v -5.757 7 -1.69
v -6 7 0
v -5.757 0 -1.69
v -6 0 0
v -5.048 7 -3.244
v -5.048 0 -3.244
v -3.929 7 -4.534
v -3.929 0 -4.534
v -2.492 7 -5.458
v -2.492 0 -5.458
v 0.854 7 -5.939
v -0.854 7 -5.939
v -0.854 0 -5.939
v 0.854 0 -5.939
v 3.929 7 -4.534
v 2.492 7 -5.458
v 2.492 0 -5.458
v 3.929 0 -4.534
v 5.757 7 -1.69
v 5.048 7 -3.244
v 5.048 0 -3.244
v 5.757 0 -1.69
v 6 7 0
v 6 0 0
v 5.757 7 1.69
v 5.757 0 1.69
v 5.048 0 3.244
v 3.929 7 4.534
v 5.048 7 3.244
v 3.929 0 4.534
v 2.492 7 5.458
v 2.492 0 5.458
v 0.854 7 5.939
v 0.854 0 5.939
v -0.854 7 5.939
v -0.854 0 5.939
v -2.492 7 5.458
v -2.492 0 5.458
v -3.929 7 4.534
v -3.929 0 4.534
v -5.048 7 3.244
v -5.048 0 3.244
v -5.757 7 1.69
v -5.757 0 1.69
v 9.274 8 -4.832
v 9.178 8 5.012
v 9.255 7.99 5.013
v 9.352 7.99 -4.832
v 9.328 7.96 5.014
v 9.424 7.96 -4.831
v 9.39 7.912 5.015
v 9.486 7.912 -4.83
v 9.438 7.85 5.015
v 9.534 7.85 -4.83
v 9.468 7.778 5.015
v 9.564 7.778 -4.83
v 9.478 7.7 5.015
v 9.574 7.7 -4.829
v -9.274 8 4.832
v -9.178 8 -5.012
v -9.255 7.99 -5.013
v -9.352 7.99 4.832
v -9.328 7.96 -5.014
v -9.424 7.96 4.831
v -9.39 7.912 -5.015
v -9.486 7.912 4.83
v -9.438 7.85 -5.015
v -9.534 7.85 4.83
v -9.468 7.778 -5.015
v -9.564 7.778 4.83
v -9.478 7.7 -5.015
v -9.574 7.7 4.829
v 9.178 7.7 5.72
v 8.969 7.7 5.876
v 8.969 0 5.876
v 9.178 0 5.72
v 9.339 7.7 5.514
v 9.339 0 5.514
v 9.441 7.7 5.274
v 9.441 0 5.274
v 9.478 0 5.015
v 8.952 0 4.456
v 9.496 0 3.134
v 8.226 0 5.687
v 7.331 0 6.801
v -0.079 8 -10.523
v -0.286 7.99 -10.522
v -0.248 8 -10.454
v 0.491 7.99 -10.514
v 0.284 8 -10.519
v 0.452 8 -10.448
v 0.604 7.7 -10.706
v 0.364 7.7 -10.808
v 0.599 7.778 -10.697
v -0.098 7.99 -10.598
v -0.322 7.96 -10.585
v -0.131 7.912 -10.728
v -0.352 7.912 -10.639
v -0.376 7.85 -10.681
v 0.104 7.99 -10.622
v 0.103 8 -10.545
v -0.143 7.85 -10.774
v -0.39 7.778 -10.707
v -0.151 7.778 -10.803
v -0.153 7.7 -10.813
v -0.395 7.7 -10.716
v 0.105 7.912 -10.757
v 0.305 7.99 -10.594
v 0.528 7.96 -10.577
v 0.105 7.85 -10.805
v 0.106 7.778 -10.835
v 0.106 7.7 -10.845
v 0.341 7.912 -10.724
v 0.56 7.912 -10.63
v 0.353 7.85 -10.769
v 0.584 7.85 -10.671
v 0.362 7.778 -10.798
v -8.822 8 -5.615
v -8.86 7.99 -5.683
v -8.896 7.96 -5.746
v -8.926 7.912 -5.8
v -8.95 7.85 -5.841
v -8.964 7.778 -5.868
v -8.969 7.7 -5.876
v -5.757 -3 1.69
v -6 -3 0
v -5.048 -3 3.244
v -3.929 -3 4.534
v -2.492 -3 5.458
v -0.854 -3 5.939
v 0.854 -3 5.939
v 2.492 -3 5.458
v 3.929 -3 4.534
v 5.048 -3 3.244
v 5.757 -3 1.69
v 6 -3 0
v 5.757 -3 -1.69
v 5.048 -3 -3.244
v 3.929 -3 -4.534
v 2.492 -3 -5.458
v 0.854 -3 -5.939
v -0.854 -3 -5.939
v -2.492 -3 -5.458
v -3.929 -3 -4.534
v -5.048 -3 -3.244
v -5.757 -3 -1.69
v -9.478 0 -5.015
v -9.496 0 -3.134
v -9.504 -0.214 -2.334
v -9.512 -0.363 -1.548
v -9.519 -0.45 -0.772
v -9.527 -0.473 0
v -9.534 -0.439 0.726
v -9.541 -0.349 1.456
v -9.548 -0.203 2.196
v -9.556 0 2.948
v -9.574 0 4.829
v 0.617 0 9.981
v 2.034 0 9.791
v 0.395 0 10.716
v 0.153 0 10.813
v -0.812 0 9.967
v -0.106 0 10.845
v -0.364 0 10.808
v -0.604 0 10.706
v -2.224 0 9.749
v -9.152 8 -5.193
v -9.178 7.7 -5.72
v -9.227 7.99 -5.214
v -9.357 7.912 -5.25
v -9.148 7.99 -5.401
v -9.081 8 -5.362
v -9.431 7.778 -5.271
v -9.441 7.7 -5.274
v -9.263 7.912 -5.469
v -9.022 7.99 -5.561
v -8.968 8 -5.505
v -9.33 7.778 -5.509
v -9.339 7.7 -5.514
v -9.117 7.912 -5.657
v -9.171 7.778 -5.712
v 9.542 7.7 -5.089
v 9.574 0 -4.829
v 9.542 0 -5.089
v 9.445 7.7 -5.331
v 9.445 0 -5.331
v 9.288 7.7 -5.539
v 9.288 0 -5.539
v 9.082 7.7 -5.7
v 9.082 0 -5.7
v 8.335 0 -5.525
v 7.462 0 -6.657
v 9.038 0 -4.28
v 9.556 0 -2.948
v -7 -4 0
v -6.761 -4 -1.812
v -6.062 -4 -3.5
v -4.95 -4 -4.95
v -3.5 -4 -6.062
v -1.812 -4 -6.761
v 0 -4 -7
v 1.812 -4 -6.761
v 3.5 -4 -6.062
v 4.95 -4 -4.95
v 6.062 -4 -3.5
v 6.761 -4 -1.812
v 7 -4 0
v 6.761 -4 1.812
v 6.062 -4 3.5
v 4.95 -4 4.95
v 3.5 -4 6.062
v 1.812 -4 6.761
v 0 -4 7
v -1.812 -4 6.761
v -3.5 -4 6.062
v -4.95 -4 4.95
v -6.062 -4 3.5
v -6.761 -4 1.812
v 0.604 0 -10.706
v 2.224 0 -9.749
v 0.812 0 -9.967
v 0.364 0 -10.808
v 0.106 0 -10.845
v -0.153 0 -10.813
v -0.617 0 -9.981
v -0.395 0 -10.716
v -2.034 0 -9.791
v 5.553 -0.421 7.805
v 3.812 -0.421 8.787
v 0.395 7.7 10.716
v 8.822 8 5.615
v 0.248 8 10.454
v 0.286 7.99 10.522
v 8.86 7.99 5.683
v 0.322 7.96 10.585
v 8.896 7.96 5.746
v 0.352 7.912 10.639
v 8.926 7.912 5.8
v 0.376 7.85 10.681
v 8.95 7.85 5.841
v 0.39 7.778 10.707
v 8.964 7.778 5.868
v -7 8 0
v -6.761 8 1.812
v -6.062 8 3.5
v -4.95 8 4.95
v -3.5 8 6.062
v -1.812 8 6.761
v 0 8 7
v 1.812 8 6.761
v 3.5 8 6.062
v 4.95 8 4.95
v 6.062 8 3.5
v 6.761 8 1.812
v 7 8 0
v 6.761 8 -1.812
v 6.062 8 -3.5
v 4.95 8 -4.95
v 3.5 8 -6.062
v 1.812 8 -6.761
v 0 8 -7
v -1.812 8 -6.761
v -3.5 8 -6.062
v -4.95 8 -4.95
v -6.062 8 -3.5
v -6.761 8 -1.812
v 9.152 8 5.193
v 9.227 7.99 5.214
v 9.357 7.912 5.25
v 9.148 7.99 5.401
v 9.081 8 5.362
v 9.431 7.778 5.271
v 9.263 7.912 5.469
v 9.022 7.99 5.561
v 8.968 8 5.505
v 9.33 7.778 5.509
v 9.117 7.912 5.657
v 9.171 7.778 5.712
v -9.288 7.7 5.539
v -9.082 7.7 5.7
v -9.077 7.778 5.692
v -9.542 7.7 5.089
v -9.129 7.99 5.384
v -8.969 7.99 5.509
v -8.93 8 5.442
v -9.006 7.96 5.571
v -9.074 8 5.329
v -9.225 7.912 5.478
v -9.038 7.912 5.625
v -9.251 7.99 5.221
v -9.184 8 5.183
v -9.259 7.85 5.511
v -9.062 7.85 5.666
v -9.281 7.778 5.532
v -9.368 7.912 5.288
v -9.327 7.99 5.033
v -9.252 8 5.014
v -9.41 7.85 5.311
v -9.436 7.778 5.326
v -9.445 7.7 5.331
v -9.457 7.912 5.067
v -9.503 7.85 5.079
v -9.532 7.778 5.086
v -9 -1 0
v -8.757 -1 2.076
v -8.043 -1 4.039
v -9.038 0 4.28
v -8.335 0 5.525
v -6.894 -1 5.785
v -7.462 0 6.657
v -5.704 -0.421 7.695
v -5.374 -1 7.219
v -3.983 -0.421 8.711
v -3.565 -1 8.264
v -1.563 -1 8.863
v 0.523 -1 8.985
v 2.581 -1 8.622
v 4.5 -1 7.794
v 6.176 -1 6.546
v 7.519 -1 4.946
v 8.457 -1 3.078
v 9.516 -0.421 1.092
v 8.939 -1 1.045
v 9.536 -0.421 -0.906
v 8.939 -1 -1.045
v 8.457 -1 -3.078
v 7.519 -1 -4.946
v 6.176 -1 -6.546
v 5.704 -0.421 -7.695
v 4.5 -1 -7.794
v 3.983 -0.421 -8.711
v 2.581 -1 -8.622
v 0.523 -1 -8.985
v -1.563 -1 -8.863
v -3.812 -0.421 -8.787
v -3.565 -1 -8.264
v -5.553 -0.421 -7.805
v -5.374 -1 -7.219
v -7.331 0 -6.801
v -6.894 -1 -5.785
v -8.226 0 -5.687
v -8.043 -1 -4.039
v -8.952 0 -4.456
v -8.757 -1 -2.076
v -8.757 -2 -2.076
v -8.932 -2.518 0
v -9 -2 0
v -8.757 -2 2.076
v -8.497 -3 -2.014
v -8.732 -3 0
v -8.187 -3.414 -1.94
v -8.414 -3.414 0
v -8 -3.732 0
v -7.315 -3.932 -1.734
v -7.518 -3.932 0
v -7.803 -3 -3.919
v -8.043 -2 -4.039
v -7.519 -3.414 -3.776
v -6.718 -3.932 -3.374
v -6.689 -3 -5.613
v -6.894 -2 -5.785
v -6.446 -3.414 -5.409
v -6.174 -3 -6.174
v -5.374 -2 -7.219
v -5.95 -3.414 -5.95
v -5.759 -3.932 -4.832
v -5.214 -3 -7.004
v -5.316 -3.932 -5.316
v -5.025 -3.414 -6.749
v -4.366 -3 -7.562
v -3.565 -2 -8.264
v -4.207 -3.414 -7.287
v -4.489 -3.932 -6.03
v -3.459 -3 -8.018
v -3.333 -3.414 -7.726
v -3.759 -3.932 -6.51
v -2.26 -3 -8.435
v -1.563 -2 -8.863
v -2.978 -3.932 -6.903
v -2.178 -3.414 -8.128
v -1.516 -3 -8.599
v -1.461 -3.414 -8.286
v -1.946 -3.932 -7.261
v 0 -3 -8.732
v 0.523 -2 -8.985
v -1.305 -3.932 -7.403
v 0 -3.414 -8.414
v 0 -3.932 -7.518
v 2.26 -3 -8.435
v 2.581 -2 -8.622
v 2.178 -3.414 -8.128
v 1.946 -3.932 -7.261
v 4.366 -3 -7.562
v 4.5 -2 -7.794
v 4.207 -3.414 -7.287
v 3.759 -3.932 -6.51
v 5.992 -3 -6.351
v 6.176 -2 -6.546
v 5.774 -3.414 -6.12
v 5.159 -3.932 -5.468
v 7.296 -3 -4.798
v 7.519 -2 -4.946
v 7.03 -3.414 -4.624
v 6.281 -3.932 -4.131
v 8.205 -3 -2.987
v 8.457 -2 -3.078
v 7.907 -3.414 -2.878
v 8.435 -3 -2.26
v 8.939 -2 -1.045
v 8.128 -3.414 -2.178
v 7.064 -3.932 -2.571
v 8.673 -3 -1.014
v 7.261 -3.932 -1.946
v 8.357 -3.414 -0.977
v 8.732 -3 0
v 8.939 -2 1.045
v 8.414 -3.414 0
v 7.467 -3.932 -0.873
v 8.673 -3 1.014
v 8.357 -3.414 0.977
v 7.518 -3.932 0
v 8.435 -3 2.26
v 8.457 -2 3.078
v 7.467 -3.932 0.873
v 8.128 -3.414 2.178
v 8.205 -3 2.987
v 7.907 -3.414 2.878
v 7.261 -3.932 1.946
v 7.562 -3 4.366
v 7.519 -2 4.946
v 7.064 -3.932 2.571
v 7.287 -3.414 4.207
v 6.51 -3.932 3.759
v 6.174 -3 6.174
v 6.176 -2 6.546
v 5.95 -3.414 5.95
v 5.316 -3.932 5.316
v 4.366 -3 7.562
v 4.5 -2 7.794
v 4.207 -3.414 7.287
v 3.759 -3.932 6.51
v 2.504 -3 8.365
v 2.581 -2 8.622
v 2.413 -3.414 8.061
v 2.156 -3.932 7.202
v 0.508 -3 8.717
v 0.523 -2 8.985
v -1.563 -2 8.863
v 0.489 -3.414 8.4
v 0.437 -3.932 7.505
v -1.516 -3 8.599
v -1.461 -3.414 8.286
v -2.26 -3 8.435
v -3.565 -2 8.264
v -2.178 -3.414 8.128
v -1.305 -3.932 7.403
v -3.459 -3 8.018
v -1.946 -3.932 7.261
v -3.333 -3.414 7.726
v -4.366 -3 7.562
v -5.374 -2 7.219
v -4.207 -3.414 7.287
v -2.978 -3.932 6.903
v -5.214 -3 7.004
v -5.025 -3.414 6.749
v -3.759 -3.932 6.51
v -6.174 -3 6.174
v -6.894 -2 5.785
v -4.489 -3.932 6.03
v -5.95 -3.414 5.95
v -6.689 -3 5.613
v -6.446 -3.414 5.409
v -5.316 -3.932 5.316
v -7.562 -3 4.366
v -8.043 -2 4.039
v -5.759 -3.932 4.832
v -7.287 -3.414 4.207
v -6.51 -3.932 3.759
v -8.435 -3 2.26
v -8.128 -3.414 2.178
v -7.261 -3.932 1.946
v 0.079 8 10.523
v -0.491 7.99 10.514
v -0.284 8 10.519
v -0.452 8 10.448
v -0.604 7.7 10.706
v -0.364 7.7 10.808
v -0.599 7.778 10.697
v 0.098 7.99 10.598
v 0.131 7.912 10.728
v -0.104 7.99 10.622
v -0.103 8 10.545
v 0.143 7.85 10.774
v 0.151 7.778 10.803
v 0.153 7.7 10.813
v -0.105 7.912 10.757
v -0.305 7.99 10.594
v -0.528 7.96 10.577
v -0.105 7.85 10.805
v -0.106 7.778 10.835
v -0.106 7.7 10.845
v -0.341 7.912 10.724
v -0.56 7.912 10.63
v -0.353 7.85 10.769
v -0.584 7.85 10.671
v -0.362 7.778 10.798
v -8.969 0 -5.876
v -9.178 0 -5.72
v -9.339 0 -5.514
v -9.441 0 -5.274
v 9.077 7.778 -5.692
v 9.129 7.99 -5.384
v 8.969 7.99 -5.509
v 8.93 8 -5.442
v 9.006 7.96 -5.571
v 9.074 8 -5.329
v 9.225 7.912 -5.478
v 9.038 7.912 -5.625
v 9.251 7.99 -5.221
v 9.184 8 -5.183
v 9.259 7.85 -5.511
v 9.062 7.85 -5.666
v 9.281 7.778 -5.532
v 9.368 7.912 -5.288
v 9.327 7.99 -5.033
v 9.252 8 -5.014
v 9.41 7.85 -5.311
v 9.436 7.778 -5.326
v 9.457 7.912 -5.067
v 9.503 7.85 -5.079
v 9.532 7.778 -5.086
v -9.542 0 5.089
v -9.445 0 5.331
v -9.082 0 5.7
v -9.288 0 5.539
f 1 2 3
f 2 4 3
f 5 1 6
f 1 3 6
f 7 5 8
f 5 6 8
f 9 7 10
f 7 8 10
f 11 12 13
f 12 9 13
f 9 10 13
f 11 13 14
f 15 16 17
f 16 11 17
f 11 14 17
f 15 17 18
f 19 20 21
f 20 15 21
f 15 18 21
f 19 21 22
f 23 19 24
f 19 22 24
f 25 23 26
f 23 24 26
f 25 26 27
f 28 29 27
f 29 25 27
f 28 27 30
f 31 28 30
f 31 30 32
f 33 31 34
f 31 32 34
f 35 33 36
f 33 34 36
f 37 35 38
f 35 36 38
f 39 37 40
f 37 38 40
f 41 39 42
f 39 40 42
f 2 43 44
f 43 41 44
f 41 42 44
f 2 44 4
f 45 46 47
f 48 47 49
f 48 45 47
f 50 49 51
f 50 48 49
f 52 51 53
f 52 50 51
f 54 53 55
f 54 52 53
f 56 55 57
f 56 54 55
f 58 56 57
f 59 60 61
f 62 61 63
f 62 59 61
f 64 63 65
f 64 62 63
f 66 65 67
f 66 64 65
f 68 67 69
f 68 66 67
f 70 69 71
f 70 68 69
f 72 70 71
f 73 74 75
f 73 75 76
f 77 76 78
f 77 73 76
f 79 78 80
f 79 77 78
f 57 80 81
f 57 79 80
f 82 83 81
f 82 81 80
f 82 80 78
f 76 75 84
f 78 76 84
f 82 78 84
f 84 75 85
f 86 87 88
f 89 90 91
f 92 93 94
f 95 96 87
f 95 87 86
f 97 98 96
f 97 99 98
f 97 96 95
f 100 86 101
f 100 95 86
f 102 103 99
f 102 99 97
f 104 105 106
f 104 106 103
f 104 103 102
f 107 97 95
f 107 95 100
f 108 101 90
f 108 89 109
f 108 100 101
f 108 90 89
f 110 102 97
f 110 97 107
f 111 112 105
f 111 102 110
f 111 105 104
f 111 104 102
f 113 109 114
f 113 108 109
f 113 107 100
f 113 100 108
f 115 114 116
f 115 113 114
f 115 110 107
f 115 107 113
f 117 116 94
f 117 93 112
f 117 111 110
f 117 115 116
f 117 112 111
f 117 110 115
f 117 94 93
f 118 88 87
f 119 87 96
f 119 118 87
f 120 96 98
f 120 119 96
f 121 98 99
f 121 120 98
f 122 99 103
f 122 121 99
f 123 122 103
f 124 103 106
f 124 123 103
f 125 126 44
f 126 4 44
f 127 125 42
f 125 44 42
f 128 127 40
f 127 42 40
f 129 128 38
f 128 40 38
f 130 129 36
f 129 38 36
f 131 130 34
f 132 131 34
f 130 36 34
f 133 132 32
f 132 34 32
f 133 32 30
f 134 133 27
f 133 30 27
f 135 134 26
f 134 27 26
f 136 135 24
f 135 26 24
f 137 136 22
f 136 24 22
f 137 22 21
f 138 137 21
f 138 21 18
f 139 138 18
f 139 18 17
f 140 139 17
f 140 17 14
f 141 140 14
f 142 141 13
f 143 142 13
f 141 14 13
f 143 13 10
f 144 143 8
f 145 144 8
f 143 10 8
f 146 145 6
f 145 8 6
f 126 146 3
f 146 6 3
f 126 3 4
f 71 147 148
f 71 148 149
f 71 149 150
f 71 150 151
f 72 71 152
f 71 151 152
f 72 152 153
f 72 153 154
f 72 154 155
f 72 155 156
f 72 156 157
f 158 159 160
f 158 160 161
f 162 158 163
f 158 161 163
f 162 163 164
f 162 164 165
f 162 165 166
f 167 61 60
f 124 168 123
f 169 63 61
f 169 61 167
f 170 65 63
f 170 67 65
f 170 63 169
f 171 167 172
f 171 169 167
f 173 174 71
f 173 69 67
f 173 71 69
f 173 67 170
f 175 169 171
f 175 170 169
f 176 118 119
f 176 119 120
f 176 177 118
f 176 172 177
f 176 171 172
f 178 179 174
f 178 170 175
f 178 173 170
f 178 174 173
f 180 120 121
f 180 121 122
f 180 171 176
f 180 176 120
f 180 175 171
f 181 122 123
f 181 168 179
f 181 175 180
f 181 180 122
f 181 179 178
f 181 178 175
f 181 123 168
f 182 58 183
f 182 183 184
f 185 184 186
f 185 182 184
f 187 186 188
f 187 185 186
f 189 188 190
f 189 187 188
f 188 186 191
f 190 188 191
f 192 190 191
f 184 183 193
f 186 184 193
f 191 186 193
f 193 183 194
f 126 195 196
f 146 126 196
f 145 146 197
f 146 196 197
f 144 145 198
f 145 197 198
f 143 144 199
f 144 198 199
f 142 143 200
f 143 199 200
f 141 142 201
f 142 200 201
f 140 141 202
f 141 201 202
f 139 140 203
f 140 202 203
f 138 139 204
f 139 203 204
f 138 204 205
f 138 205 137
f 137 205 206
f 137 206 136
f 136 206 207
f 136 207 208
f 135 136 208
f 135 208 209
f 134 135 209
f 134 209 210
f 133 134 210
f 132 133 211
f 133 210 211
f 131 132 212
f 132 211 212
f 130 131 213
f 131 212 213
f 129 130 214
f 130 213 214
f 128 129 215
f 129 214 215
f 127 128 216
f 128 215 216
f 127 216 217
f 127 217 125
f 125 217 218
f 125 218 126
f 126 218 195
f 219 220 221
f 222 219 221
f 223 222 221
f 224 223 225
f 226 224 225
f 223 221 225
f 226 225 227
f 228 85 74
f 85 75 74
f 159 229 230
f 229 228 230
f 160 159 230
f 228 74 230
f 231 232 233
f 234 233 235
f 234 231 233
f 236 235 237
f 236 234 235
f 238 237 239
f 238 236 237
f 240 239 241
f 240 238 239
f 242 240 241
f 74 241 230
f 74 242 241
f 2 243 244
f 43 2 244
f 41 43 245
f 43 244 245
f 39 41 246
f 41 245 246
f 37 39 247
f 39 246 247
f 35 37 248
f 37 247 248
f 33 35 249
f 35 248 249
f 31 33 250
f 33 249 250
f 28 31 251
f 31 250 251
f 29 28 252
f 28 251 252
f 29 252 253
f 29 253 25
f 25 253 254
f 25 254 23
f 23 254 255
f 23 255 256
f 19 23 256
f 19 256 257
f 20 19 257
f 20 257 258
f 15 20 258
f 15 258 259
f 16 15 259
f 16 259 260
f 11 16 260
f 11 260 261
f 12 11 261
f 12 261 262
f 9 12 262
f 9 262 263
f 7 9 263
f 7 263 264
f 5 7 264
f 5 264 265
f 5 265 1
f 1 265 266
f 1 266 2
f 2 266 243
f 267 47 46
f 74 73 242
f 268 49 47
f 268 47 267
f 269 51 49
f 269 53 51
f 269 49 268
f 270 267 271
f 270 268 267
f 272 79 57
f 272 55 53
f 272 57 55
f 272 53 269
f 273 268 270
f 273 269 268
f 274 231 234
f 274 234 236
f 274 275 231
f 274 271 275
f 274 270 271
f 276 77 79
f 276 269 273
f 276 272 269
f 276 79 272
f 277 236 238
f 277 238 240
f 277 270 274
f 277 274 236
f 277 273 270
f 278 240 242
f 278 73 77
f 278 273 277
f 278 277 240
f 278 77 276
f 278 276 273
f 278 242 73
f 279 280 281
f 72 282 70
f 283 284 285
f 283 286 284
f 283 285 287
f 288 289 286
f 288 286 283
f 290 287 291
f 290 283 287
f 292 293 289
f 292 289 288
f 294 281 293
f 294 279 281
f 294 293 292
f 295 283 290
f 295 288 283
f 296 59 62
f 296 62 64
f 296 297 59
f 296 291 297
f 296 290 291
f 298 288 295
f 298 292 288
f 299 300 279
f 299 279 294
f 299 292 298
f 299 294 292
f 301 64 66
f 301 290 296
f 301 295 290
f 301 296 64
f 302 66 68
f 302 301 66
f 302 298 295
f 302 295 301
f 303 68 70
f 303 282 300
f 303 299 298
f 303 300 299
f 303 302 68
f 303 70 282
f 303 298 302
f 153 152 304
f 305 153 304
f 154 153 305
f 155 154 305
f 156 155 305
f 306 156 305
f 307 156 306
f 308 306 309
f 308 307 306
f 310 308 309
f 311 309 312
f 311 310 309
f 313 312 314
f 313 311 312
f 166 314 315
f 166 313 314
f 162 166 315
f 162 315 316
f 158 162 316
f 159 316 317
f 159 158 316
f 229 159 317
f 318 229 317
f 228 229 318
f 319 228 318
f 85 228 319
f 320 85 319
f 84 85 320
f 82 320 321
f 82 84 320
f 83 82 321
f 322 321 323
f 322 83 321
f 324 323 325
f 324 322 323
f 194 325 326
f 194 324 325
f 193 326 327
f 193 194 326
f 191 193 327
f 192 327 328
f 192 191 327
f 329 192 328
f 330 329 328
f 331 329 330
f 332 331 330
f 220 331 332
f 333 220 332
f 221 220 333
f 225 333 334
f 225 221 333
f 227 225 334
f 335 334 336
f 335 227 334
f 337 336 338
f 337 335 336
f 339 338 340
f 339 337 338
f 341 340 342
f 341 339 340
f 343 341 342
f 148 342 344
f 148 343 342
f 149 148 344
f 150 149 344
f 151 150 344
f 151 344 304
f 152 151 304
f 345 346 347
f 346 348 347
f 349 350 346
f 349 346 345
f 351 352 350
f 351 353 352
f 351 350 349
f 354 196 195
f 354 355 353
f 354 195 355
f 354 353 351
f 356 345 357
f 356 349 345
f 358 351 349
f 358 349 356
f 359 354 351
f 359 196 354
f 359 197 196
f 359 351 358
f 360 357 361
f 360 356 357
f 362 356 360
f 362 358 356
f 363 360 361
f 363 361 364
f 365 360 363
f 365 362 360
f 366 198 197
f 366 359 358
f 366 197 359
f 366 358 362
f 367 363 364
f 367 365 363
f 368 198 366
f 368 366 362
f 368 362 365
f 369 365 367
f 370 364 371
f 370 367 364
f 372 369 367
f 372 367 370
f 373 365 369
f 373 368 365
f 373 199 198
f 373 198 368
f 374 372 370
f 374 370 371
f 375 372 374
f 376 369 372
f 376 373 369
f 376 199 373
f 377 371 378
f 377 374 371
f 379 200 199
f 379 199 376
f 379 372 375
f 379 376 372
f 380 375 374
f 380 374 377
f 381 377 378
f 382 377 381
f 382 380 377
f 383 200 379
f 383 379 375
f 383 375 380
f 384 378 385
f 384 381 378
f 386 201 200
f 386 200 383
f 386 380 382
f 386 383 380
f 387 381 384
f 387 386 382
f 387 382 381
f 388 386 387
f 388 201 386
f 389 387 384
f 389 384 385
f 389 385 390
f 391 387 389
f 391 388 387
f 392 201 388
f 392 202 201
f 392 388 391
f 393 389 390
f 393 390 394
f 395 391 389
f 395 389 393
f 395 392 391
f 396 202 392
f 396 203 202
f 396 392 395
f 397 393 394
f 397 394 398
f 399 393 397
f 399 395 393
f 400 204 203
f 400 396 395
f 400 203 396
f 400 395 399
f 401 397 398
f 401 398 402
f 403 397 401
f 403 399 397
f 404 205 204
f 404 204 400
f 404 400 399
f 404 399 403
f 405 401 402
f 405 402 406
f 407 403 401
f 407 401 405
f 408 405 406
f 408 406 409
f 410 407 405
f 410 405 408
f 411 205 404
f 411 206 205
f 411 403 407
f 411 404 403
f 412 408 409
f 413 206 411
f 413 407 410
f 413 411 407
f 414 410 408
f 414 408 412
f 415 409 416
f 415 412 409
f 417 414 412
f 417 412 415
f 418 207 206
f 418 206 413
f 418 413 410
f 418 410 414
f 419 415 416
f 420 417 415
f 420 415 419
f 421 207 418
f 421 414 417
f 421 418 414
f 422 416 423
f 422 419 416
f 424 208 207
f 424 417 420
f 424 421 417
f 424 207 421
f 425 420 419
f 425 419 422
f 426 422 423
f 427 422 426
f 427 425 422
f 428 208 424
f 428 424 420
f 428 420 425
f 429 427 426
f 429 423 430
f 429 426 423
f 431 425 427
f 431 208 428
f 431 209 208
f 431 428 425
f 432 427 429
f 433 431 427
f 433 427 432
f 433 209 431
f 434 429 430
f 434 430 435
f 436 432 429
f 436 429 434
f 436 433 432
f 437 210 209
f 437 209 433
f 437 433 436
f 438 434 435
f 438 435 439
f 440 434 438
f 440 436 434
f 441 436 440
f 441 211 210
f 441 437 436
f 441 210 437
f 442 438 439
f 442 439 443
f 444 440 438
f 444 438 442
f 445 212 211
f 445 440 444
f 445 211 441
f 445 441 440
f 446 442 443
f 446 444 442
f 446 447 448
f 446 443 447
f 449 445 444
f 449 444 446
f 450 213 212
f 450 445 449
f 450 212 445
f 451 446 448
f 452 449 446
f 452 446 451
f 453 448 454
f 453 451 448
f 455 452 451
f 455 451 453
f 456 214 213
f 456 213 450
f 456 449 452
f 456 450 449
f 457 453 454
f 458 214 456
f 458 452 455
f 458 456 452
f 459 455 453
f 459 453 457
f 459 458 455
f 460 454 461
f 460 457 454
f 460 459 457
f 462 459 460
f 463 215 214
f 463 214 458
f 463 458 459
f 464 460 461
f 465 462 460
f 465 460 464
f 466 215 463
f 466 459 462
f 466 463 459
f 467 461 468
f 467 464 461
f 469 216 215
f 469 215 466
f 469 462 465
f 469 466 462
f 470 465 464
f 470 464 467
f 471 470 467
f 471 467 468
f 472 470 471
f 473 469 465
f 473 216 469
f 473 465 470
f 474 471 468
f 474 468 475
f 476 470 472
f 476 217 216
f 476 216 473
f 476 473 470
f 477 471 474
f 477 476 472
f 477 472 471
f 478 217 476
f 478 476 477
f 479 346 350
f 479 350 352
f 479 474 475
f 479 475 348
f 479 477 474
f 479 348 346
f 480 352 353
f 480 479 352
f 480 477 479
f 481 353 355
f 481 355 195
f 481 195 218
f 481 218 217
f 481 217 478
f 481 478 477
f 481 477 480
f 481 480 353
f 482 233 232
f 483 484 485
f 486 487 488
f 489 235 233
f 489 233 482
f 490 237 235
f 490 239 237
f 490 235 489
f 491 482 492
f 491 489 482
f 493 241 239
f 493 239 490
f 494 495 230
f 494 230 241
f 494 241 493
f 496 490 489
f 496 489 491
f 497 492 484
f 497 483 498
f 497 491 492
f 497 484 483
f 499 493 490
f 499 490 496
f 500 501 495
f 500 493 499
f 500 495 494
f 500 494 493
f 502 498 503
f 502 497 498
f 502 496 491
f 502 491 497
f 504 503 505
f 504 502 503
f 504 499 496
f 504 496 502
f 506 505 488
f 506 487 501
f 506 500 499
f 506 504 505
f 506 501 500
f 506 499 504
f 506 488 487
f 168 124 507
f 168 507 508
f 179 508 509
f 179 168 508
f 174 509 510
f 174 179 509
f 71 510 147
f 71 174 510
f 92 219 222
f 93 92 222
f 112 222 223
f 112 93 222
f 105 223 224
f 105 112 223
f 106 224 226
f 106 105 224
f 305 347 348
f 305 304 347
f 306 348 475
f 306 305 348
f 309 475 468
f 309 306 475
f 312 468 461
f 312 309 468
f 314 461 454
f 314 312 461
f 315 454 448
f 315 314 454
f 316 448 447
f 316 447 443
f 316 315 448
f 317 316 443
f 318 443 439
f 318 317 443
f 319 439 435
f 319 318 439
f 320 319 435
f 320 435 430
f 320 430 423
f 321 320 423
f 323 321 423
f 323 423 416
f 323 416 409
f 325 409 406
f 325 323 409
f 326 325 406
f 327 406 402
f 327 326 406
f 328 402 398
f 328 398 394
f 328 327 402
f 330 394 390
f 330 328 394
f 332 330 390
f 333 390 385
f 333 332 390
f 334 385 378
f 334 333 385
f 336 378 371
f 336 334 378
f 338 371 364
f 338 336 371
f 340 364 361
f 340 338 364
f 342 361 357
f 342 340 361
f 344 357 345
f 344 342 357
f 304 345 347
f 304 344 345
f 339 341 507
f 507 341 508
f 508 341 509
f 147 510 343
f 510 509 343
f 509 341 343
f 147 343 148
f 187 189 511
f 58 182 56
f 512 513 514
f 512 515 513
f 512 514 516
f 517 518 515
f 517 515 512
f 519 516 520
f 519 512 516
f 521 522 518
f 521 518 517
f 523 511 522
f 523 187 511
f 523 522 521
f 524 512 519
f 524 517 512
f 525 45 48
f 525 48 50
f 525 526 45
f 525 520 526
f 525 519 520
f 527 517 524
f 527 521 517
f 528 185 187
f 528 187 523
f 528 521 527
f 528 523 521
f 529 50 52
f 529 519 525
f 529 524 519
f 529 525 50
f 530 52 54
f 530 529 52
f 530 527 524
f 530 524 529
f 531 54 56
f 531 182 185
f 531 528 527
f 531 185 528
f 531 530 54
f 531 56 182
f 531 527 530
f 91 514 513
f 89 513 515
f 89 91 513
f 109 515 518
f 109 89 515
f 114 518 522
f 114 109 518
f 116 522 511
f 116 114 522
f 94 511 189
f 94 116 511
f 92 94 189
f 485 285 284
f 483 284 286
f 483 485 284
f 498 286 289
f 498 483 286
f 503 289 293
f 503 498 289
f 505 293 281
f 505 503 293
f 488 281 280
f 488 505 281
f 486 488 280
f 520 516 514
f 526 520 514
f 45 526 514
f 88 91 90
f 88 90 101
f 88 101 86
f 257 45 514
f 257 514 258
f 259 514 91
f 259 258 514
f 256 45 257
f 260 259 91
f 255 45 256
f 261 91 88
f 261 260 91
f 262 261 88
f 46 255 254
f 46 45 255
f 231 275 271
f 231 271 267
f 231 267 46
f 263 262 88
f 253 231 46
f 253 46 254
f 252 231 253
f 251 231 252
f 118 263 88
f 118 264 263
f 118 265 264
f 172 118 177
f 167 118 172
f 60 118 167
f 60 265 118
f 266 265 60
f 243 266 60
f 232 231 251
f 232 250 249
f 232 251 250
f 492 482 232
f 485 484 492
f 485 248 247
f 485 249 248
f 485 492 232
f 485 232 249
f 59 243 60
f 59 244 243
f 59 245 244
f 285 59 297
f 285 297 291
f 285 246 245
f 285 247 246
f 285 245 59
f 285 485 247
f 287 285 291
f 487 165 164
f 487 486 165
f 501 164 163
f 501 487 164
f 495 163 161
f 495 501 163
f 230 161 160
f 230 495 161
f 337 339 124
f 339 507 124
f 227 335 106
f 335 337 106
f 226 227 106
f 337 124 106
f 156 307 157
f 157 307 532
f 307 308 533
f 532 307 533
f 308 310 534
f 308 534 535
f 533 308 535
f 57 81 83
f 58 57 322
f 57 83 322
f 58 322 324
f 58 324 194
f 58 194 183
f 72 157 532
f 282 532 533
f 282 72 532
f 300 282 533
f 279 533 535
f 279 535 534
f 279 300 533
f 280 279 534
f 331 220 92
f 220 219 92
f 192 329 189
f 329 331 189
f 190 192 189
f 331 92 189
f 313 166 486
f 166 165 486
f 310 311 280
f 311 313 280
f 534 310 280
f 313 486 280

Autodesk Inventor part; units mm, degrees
ref_plane "YZ Plane" through (0, 0, 0) normal (1, 0, 0) x (0, 1, 0)
ref_plane "XZ Plane" through (0, 0, 0) normal (0, 1, 0) x (-1, 0, 0)
ref_plane "XY Plane" through (0, 0, 0) normal (0, 0, 1) x (1, 0, 0)
sketch "Sketch1" plane through (0, 0, 0) normal (0, 1, 0) x (-1, 0, 0)
  line L0 (9.5795, 5.4068) -> (9.4722, -5.5927)
  line L1 (9.4722, -5.5927) -> (-0.1073, -10.9995)
  line L2 (-0.1073, -10.9995) -> (-9.5795, -5.4068)
  line L3 (-9.5795, -5.4068) -> (-9.4722, 5.5927)
  line L4 (-9.4722, 5.5927) -> (0.1073, 10.9995)
  line L5 (0.1073, 10.9995) -> (9.5795, 5.4068)
  circle A0 centre (0, 0) radius 6
  circle A1 centre (0, 0) radius 9
  dimension "d0" = 11
  dimension "d1" = 12
  dimension "d8" = 18
extrude "Extrusion1" add sketch "Sketch1" along normal blind 8 contours L0 L1 L2 L3 L4 L5 | A1
extrude "Extrusion2" add sketch "Sketch1" against normal blind 4 contours A1
fillet "Fillet1" radius 2 1 edges at (9, -4, 0)
chamfer "Chamfer1" distance 1 angle 45 1 edges at (9, 0, 0)
thread "Thread1" size "M12x1.75" class "6H" standard "ANSI Metric M Profile" full length
chamfer "Chamfer2" distance 1 angle 45 2 edges at (6, -4, 0) (6, 8, 0)
fillet "Fillet3" radius 1 6 edges at (-9.5795, 4, 5.4068) (-9.4722, 4, -5.5927) (0.1073, 4, -10.9995) (-0.1073, 4, 10.9995) (9.4722, 4, 5.5927) (9.5795, 4, -5.4068)
fillet "Fillet4" radius 0.3 12 edges at (9.339, 8, 5.514) (9.5258, 8, 0.0929) (9.4448, 8, -5.3308) (4.8434, 8, -8.2031) (0.1058, 8, -10.8448) (-4.6824, 8, -8.2961) (-9.339, 8, -5.514) (-9.5258, 8, -0.0929) (-9.4448, 8, 5.3308) (-4.8434, 8, 8.2031) (-0.1058, 8, 10.8448) (4.6824, 8, 8.2961)
properties part number "SpanoloAnya"
